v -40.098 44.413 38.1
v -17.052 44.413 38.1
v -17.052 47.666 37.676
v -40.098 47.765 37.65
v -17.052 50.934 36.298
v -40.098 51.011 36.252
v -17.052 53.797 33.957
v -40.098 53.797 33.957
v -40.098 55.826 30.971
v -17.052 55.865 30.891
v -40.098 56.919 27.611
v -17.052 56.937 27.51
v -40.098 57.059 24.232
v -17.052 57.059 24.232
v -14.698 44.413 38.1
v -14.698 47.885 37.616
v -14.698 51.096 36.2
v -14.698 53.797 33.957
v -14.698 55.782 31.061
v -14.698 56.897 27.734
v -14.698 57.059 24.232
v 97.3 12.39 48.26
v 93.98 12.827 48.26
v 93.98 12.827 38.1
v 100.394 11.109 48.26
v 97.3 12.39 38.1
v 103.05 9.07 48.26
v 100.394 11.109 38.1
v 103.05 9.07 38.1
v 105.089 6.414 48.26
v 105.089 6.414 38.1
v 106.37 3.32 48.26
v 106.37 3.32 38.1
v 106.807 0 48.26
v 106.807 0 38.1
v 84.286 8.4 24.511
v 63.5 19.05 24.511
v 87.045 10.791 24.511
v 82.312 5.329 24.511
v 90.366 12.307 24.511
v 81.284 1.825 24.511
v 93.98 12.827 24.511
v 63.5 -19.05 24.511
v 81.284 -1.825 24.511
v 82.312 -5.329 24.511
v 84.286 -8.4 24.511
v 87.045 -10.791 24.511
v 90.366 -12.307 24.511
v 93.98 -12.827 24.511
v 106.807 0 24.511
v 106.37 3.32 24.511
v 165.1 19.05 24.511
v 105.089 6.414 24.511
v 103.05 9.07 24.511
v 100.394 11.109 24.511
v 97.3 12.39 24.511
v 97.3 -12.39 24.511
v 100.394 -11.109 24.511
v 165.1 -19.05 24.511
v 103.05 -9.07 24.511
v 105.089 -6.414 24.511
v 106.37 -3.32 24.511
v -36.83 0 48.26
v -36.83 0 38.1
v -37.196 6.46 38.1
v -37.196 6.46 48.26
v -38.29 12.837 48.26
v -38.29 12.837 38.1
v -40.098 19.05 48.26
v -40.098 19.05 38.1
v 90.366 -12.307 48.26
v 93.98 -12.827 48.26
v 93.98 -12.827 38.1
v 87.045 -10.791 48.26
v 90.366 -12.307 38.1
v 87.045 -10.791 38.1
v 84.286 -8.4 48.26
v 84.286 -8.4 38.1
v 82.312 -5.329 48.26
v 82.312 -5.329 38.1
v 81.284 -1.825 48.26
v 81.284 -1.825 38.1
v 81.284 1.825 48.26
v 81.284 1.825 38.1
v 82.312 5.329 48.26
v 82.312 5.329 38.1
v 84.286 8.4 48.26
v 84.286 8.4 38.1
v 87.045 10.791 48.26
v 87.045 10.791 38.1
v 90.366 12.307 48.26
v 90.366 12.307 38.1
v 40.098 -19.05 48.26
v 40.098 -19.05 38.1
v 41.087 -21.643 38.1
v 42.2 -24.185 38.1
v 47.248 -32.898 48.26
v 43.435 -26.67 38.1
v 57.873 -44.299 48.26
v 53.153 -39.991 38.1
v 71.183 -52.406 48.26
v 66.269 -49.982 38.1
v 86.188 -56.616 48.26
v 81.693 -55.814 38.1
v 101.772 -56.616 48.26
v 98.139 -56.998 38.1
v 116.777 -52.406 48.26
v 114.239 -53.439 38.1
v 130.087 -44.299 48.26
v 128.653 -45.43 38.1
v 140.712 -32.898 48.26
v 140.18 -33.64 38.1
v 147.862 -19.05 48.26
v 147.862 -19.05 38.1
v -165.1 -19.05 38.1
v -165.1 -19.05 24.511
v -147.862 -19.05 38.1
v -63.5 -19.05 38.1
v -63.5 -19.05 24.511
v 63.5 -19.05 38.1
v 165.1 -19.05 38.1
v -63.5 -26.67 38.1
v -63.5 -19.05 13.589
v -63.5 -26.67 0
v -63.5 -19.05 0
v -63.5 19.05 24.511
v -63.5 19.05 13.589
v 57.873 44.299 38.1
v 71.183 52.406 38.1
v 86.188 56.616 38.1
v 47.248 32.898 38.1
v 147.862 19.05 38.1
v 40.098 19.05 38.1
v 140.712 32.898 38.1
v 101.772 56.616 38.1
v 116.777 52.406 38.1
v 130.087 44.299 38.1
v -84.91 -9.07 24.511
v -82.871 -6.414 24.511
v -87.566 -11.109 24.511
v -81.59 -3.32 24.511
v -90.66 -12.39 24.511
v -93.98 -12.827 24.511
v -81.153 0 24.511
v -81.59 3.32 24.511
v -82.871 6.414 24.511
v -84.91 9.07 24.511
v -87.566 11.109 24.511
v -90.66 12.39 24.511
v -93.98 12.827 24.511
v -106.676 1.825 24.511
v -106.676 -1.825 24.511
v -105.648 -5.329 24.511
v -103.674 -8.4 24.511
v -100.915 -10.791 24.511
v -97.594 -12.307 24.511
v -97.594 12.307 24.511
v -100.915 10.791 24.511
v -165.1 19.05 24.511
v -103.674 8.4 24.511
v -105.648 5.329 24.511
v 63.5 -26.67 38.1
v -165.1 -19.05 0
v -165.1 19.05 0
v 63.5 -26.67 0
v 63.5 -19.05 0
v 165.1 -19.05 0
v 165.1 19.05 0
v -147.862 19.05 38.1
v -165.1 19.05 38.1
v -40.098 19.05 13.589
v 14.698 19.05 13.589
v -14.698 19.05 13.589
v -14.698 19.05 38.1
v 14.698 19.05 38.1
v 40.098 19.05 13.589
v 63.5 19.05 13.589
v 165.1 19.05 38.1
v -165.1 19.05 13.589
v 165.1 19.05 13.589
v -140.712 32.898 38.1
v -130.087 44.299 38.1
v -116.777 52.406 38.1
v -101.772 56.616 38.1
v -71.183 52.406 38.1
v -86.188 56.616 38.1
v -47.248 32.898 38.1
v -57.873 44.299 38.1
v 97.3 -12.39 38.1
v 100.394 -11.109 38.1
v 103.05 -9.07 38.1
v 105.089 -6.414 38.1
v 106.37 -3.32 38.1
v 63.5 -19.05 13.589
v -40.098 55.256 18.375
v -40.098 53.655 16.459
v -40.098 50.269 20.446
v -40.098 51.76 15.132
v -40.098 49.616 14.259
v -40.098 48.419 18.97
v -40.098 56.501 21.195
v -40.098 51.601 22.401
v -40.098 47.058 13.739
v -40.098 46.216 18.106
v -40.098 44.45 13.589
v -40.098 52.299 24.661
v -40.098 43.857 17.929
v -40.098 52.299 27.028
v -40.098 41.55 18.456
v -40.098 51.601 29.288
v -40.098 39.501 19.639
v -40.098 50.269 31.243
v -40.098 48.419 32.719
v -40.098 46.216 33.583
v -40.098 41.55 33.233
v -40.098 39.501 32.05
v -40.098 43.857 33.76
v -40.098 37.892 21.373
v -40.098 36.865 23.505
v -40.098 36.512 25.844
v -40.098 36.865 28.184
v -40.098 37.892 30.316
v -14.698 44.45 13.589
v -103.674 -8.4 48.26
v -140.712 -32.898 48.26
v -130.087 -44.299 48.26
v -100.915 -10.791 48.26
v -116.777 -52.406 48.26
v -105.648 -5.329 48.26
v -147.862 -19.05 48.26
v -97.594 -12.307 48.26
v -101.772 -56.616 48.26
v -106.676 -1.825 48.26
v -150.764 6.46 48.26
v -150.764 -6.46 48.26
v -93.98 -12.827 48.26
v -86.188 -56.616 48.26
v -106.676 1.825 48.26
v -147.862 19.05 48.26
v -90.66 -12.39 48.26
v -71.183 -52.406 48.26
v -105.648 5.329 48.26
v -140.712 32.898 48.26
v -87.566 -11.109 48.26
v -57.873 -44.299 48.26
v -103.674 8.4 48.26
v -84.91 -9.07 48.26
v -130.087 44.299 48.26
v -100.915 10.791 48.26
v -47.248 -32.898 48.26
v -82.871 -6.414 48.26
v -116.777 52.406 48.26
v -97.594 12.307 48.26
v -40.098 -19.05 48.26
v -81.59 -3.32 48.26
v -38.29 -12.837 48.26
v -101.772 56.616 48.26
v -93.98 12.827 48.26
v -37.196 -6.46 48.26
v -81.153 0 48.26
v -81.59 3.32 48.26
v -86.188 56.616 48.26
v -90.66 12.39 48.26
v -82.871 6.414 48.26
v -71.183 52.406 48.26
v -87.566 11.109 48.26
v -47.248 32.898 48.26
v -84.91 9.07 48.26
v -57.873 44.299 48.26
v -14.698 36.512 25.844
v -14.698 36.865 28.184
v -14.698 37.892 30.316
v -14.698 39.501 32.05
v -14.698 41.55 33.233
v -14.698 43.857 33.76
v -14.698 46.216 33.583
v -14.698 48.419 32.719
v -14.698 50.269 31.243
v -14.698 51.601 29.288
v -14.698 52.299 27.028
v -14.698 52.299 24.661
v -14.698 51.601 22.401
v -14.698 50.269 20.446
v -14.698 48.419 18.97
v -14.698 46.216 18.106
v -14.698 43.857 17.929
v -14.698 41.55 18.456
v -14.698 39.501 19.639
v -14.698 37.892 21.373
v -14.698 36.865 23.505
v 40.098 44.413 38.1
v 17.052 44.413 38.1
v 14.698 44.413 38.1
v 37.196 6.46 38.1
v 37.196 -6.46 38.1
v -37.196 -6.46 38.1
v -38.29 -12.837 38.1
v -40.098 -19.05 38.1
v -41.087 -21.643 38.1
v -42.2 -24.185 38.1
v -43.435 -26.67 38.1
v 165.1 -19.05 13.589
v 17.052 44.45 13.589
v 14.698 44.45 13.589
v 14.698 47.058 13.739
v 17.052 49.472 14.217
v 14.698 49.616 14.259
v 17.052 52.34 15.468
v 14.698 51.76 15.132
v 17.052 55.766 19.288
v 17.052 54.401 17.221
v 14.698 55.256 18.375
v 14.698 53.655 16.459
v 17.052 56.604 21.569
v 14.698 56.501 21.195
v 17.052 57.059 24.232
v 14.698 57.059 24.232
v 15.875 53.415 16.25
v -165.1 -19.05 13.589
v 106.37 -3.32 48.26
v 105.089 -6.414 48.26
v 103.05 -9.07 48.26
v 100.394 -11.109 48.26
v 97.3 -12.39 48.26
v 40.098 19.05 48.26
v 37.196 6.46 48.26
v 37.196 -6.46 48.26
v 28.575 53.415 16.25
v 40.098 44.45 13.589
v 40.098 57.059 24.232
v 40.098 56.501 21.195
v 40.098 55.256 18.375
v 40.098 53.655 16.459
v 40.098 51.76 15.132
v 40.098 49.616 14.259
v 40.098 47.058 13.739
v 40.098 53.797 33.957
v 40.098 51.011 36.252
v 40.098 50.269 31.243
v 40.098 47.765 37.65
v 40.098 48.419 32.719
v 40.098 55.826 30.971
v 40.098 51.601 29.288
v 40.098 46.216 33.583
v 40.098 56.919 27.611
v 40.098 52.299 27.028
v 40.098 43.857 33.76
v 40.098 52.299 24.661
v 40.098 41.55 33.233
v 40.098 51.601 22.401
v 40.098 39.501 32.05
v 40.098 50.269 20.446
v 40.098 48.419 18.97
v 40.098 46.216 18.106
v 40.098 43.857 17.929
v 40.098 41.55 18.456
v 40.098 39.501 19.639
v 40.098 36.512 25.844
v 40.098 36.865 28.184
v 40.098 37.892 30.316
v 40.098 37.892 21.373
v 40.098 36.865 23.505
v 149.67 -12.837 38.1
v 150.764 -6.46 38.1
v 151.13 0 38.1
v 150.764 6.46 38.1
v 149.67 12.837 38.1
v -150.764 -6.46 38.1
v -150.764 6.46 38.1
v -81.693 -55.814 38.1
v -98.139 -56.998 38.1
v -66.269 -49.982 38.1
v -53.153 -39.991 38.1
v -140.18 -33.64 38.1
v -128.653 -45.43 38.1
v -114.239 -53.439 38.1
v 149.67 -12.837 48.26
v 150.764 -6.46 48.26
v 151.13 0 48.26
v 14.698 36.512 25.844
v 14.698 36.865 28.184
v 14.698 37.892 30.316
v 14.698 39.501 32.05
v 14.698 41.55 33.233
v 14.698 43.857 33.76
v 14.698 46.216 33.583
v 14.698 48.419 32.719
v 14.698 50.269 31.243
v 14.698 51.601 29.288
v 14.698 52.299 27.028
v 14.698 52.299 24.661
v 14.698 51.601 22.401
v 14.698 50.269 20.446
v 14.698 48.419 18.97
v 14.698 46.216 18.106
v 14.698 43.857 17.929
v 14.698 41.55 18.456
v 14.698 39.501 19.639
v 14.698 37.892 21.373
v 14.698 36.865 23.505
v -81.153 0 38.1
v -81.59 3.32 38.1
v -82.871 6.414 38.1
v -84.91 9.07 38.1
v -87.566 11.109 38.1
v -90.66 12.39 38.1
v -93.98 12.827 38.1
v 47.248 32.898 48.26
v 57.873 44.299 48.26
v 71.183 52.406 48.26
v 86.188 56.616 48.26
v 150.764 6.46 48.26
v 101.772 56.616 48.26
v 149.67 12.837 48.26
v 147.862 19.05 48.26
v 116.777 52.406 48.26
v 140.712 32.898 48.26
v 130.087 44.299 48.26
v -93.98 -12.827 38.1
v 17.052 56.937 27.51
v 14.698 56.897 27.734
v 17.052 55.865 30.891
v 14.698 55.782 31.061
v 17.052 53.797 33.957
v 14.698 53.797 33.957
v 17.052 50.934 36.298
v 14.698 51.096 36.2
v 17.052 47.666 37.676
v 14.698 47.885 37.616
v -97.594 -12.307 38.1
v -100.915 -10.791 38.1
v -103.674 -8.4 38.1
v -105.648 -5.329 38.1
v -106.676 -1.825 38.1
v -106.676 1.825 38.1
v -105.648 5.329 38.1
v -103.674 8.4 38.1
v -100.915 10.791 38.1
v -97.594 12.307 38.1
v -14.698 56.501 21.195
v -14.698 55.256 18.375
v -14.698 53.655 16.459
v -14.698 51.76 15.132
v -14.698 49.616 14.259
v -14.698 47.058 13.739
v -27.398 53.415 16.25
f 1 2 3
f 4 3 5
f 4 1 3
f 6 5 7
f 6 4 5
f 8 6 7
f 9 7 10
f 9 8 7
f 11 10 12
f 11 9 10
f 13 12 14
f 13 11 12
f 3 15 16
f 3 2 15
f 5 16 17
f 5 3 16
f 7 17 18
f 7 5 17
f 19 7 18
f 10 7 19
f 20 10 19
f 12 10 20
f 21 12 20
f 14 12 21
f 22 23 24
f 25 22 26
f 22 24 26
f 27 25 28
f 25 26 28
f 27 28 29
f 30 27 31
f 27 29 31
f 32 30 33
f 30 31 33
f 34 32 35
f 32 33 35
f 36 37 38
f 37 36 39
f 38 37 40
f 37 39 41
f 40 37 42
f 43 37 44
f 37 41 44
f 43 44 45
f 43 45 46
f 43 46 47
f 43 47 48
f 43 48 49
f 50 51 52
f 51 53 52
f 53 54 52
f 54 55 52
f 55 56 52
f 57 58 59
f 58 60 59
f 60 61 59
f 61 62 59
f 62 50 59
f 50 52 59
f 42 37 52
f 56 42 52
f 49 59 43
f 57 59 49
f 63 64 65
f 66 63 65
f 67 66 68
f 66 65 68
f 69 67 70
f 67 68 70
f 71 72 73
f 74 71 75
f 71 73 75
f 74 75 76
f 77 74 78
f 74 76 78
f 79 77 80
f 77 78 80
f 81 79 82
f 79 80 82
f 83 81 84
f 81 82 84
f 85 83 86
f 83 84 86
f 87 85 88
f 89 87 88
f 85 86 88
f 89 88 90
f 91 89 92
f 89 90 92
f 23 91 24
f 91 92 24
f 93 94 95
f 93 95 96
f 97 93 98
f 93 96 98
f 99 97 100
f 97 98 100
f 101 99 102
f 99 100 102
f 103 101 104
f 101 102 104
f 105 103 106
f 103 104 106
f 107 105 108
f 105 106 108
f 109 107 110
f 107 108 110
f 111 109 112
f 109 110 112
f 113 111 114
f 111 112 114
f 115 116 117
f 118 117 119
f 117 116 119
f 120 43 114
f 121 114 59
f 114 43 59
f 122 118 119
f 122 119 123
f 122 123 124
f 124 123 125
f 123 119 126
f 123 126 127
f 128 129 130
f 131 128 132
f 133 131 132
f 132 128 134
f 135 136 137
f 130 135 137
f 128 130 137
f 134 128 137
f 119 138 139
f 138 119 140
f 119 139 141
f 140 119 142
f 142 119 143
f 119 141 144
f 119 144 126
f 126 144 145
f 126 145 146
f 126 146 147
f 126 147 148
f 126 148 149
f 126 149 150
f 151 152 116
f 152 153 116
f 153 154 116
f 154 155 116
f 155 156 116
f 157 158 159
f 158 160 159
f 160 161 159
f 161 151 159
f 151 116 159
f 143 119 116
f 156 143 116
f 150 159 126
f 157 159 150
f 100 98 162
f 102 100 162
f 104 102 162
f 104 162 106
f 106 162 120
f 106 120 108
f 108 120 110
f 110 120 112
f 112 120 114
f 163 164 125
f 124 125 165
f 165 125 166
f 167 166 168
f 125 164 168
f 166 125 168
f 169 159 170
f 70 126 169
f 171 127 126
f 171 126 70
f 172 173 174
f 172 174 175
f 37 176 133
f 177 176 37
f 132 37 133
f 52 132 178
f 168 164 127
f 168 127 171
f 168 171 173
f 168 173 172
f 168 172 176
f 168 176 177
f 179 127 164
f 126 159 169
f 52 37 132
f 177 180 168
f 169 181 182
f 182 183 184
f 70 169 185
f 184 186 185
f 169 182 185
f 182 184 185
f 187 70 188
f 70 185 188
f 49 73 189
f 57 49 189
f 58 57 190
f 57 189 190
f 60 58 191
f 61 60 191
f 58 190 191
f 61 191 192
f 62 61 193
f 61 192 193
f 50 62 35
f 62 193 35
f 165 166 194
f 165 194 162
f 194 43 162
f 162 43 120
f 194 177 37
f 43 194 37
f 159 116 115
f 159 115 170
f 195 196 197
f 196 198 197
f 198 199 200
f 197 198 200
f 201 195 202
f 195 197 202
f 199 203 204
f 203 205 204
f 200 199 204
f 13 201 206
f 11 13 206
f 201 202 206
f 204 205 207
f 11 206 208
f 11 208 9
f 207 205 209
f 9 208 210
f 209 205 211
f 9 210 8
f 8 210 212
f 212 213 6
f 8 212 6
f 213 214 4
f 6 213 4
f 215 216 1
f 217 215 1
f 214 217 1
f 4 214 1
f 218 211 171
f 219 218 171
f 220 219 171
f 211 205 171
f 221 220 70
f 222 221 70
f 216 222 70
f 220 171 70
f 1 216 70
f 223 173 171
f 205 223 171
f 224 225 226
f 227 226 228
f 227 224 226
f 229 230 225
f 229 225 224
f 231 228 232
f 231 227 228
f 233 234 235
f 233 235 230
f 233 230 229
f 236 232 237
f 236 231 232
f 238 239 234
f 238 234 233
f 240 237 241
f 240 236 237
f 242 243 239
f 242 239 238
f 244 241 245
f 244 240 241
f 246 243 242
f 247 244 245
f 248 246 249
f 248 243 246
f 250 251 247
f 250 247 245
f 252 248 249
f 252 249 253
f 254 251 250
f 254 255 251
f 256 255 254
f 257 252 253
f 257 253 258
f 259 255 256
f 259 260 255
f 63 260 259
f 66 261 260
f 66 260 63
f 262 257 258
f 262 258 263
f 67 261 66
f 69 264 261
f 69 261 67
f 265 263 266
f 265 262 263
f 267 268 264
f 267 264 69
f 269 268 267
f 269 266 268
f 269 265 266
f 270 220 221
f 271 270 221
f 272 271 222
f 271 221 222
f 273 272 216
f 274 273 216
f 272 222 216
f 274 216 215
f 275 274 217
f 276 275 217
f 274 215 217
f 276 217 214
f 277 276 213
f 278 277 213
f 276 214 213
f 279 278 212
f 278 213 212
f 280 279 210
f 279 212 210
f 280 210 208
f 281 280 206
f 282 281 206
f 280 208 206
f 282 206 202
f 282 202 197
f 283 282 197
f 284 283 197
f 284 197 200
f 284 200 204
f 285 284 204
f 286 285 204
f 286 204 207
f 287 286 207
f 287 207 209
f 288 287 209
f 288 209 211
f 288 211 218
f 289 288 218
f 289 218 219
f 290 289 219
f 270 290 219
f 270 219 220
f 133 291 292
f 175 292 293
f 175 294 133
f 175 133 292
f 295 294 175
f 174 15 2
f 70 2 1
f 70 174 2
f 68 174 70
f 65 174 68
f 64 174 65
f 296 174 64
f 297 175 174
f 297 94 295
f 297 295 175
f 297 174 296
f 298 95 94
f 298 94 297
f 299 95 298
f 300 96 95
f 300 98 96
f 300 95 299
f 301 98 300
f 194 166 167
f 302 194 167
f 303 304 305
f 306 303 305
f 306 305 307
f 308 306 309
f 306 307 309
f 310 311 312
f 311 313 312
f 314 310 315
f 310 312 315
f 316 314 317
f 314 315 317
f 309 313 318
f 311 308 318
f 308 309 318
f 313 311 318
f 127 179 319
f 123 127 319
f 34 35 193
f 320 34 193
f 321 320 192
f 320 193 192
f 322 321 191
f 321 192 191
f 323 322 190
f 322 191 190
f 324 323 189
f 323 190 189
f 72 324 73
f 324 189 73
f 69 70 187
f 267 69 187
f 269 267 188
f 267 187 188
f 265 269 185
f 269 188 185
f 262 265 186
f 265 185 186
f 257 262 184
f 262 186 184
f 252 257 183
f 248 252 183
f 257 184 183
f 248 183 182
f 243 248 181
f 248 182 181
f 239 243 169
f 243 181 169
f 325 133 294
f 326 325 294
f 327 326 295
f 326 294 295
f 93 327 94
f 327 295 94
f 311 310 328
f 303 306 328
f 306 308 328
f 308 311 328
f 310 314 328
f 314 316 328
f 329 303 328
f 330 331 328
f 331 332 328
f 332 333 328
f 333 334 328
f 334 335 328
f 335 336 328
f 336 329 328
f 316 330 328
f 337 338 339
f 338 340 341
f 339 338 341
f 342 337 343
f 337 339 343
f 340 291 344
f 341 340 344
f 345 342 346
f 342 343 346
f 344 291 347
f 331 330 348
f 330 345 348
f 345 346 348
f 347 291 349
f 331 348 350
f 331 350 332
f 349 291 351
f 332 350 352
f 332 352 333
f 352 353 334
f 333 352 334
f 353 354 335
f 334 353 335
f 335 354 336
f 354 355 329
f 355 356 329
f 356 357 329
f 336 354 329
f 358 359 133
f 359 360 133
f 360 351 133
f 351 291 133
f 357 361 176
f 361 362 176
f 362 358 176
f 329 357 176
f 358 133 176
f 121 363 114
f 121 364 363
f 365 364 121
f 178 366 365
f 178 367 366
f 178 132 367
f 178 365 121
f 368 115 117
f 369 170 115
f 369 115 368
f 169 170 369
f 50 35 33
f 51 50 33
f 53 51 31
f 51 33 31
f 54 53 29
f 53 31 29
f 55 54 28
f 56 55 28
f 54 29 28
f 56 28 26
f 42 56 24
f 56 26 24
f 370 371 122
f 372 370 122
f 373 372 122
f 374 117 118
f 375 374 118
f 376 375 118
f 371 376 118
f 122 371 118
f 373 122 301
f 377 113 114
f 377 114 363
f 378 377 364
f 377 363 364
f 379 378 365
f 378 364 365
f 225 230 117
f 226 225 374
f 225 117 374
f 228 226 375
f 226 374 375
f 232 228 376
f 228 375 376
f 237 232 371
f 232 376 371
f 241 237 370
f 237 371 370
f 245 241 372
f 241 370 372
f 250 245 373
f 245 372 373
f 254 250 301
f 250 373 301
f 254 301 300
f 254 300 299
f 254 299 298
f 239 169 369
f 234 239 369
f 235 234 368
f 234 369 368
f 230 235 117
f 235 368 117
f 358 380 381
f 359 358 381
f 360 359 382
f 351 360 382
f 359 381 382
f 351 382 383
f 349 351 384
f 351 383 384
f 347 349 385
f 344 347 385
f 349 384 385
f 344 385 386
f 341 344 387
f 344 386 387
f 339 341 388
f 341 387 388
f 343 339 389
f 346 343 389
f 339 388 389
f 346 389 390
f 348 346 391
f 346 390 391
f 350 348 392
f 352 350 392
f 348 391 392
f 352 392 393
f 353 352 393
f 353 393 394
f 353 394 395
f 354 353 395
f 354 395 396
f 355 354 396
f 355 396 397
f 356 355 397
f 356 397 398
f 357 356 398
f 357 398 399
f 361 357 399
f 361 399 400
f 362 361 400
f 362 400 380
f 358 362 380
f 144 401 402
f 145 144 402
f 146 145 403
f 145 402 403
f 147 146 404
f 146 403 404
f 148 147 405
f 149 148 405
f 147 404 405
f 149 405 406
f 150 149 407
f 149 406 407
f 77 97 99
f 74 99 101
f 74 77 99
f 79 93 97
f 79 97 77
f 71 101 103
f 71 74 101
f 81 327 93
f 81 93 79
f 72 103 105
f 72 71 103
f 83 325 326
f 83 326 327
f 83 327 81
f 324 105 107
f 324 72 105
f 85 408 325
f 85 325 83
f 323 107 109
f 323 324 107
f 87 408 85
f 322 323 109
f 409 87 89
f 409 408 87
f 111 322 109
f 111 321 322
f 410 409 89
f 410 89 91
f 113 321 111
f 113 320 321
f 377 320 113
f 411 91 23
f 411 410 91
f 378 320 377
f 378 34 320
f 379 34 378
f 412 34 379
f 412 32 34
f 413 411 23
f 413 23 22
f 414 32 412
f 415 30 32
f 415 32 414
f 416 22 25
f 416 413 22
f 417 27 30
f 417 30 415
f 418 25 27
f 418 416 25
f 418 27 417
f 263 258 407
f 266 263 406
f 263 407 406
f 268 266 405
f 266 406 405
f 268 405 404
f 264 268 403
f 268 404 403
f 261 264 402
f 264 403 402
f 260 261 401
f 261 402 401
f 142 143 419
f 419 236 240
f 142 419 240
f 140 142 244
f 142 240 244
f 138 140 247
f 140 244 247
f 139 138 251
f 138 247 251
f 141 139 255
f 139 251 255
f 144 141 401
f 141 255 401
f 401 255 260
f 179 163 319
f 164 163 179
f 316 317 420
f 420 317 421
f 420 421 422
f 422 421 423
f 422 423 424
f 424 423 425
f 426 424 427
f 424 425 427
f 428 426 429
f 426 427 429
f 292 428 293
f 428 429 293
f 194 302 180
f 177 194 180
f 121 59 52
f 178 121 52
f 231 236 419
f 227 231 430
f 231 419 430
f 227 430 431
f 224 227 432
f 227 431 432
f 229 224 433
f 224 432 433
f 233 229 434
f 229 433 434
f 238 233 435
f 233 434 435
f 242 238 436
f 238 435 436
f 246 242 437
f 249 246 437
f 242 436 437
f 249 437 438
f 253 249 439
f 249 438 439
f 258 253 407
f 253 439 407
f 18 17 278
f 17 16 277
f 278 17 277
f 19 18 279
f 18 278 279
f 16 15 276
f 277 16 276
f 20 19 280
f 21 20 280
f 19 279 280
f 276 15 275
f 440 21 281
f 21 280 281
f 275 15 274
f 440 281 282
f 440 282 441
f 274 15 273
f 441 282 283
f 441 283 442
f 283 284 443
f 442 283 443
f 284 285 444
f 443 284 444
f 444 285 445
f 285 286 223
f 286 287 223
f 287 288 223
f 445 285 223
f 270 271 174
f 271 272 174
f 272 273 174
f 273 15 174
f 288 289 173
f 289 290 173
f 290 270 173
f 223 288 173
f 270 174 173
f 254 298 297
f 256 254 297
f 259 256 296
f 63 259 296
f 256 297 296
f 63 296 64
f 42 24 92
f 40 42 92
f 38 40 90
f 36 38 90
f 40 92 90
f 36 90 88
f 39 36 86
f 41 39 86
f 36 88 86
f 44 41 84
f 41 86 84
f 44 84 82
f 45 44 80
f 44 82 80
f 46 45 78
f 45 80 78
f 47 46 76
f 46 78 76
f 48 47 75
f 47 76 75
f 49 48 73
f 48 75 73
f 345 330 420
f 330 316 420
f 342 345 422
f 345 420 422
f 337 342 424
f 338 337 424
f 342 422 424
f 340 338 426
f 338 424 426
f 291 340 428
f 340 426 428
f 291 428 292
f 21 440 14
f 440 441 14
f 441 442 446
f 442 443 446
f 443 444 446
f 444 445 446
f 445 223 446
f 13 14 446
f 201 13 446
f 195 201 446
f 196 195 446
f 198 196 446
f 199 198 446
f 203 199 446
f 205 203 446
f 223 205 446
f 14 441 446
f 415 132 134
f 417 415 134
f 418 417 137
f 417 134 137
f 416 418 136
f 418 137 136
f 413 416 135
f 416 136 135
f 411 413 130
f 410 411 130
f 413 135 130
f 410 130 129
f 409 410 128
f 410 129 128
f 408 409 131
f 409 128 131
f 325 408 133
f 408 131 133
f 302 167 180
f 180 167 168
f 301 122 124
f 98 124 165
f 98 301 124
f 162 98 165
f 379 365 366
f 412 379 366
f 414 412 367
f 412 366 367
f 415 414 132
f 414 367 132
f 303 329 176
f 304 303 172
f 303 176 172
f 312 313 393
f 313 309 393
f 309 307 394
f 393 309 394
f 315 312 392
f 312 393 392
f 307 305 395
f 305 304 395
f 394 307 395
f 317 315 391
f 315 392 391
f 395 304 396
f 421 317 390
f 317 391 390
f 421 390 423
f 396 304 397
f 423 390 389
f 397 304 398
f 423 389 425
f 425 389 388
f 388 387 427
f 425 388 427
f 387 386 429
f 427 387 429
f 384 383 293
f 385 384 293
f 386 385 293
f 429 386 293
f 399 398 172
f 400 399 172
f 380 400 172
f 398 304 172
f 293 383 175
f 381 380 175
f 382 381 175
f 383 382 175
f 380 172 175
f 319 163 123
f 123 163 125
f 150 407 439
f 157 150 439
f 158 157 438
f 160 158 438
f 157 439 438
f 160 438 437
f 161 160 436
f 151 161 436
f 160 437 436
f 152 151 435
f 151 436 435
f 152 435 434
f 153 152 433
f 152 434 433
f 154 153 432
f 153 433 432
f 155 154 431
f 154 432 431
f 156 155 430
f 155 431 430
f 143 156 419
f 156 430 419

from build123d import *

# Parameters (mm, degrees)
F0_W         = 330.2
F0_H         = 38.1
F1_DEPTH     = 38.1
F2_W         = 19.05
F2_H         = 10.922
F3_DEPTH     = 101.6
F4_W         = 19.05
F4_H         = 10.922
F5_DEPTH     = 101.6
F7_DEPTH     = 22.86
F8_DEPTH     = 10.16
F10_DEPTH    = 7.62
F11_W        = 25.4
F11_H        = 13.589
F11_H_2      = 10.922
F12_DEPTH    = 38.1
F13_T1_DEPTH = 88.9
F13_T3_DEPTH = 88.9
F14_R        = 12.7
F16_DEPTH    = 101.6


# Not quite as in the source:
# - a fillet or chamfer that OpenCascade refuses, or shapes differently, is made with other operations: its cross-section is extruded or revolved along the edge and cut away or added
# - after a boolean that leaves OpenCascade's solid faulty, fix() repairs it
# - a feature names something its author has since deleted; it is built from what else it names


with BuildPart() as f1:
    # F0 (on Top) → F1 (new body)
    with BuildSketch(Plane.XY):
        Rectangle(F0_W, F0_H)
    extrude(amount=F1_DEPTH)

    # F2 (on face) → F3 (cut)
    with BuildSketch(Plane(origin=(-165.1, 0, 0), x_dir=(0, -1, 0), z_dir=(-1, 0, 0))):
        with Locations((9.525, 19.05)):
            Rectangle(F2_W, F2_H)
        with Locations((-9.525, 19.05)):
            Rectangle(F2_W, F2_H)
    extrude(amount=-F3_DEPTH, mode=Mode.SUBTRACT)

    # F4 (on face) → F5 (cut)
    with BuildSketch(Plane.YZ.offset(165.1)):
        with Locations((-9.525, 19.05)):
            Rectangle(F4_W, F4_H)
        with Locations((9.525, 19.05)):
            Rectangle(F4_W, F4_H)
    extrude(amount=-F5_DEPTH, mode=Mode.SUBTRACT)

    # F6 (on face) → F7 (cut)
    with BuildSketch(Plane.XY.offset(38.1)):
        with BuildLine():
            Line((-93.98, 12.827), (-93.98, -12.827))
            ThreePointArc((-93.98, -12.827), (-84.9099413177, -9.0700586823), (-81.153, 0))
            ThreePointArc((-81.153, 0), (-84.9099413177, 9.0700586823), (-93.98, 12.827))
        make_face()
        with BuildLine():
            ThreePointArc((-93.98, 12.827), (-106.807, 0), (-93.98, -12.827))
            Line((-93.98, -12.827), (-93.98, 12.827))
        make_face()
        with BuildLine():
            ThreePointArc((93.98, 12.827), (81.153, 0), (93.98, -12.827))
            Line((93.98, -12.827), (93.98, 12.827))
        make_face()
        with BuildLine():
            Line((93.98, 12.827), (93.98, -12.827))
            ThreePointArc((93.98, -12.827), (103.0500586823, -9.0700586823), (106.807, 0))
            ThreePointArc((106.807, 0), (103.0500586823, 9.0700586823), (93.98, 12.827))
        make_face()
    extrude(amount=-F7_DEPTH, mode=Mode.SUBTRACT)

    # F6 (on face) → F8 (join)
    with BuildSketch(Plane.XY.offset(38.1)):
        with BuildLine():
            ThreePointArc((110.7805208253, 19.05), (93.98, 25.4), (77.1794791747, 19.05))
            Line((77.1794791747, 19.05), (93.98, 19.05))
            Line((93.98, 19.05), (110.7805208253, 19.05))
        make_face()
        with BuildLine():
            Line((110.7805208253, -19.05), (147.8615367264, -19.05))
            ThreePointArc((147.8615367264, -19.05), (150.3069576842, -9.6641780842), (151.13, 0))
            ThreePointArc((151.13, 0), (150.3069576842, 9.6641780842), (147.8615367264, 19.05))
            Line((147.8615367264, 19.05), (110.7805208253, 19.05))
            ThreePointArc((110.7805208253, 19.05), (117.1305208253, 10.4505208253), (119.38, 0))
            ThreePointArc((119.38, 0), (117.1305208253, -10.4505208253), (110.7805208253, -19.05))
        make_face()
        with BuildLine():
            ThreePointArc((147.8615367264, 19.05), (93.98, 57.15), (40.0984632736, 19.05))
            Line((40.0984632736, 19.05), (77.1794791747, 19.05))
            ThreePointArc((77.1794791747, 19.05), (93.98, 25.4), (110.7805208253, 19.05))
            Line((110.7805208253, 19.05), (147.8615367264, 19.05))
        make_face()
        with BuildLine():
            ThreePointArc((77.1794791747, 19.05), (68.58, 0), (77.1794791747, -19.05))
            Line((77.1794791747, -19.05), (93.98, -19.05))
            Line((93.98, -19.05), (93.98, -12.827))
            ThreePointArc((93.98, -12.827), (81.153, 0), (93.98, 12.827))
            Line((93.98, 12.827), (93.98, 19.05))
            Line((93.98, 19.05), (77.1794791747, 19.05))
        make_face()
        with BuildLine():
            Line((93.98, -19.05), (110.7805208253, -19.05))
            ThreePointArc((110.7805208253, -19.05), (117.1305208253, -10.4505208253), (119.38, 0))
            ThreePointArc((119.38, 0), (117.1305208253, 10.4505208253), (110.7805208253, 19.05))
            Line((110.7805208253, 19.05), (93.98, 19.05))
            Line((93.98, 19.05), (93.98, 12.827))
            ThreePointArc((93.98, 12.827), (103.0500586823, 9.0700586823), (106.807, 0))
            ThreePointArc((106.807, 0), (103.0500586823, -9.0700586823), (93.98, -12.827))
            Line((93.98, -12.827), (93.98, -19.05))
        make_face()
        with BuildLine():
            ThreePointArc((40.0984632736, 19.05), (36.83, 0), (40.0984632736, -19.05))
            Line((40.0984632736, -19.05), (77.1794791747, -19.05))
            ThreePointArc((77.1794791747, -19.05), (68.58, 0), (77.1794791747, 19.05))
            Line((77.1794791747, 19.05), (40.0984632736, 19.05))
        make_face()
        with BuildLine():
            Line((77.1794791747, -19.05), (40.0984632736, -19.05))
            ThreePointArc((40.0984632736, -19.05), (93.98, -57.15), (147.8615367264, -19.05))
            Line((147.8615367264, -19.05), (110.7805208253, -19.05))
            ThreePointArc((110.7805208253, -19.05), (93.98, -25.4), (77.1794791747, -19.05))
        make_face()
        with BuildLine():
            Line((93.98, -19.05), (77.1794791747, -19.05))
            ThreePointArc((77.1794791747, -19.05), (93.98, -25.4), (110.7805208253, -19.05))
            Line((110.7805208253, -19.05), (93.98, -19.05))
        make_face()
        with BuildLine():
            Line((-93.98, -12.827), (-93.98, -19.05))
            Line((-93.98, -19.05), (-40.0984632736, -19.05))
            ThreePointArc((-40.0984632736, -19.05), (-37.6530423158, -9.6641780842), (-36.83, 0))
            ThreePointArc((-36.83, 0), (-37.6530423158, 9.6641780842), (-40.0984632736, 19.05))
            Line((-40.0984632736, 19.05), (-93.98, 19.05))
            Line((-93.98, 19.05), (-93.98, 12.827))
            ThreePointArc((-93.98, 12.827), (-84.9099413177, 9.0700586823), (-81.153, 0))
            ThreePointArc((-81.153, 0), (-84.9099413177, -9.0700586823), (-93.98, -12.827))
        make_face()
        with BuildLine():
            Line((-147.8615367264, -19.05), (-93.98, -19.05))
            Line((-93.98, -19.05), (-93.98, -12.827))
            ThreePointArc((-93.98, -12.827), (-106.807, 0), (-93.98, 12.827))
            Line((-93.98, 12.827), (-93.98, 19.05))
            Line((-93.98, 19.05), (-147.8615367264, 19.05))
            ThreePointArc((-147.8615367264, 19.05), (-151.13, 0), (-147.8615367264, -19.05))
        make_face()
        with BuildLine():
            Line((-40.0984632736, -19.05), (-93.98, -19.05))
            Line((-93.98, -19.05), (-147.8615367264, -19.05))
            ThreePointArc((-147.8615367264, -19.05), (-93.98, -57.15), (-40.0984632736, -19.05))
        make_face()
        with BuildLine():
            ThreePointArc((-40.0984632736, 19.05), (-93.98, 57.15), (-147.8615367264, 19.05))
            Line((-147.8615367264, 19.05), (-93.98, 19.05))
            Line((-93.98, 19.05), (-40.0984632736, 19.05))
        make_face()
    extrude(amount=F8_DEPTH)

    # F9 (on face) → F10 (join)
    with BuildSketch(Plane.XZ.offset(19.05)):
        Polygon((0, 0), (0, 38.1), (-40.0984632736, 38.1), (-63.5, 38.1), (-63.5, 30.861), (-63.5, 24.511), (-63.5, 19.939), (-63.5, 13.589), (-63.5, 0), align=None)
        Polygon((63.5, 30.861), (63.5, 38.1), (40.0984632736, 38.1), (13.5538854515, 38.1), (0, 38.1), (0, 0), (63.5, 0), (63.5, 13.589), (63.5, 19.939), (63.5, 24.511), align=None)
    extrude(amount=F10_DEPTH)

    add(f1.part.fix(), mode=Mode.REPLACE)

    # F11 (on face) → F12 (join)
    with BuildSketch(Plane(origin=(0, 19.05, 0), x_dir=(-1, 0, 0), z_dir=(0, 1, 0))):
        with Locations((-27.3984632736, 31.3055)):
            Rectangle(F11_W, F11_H)
        with Locations((-27.3984632736, 19.05)):
            Rectangle(F11_W, F11_H_2)
        with Locations((27.3984632736, 19.05)):
            Rectangle(F11_W, F11_H_2)
        with Locations((27.3984632736, 31.3055)):
            Rectangle(F11_W, F11_H)
    extrude(amount=F12_DEPTH)

    # F13: fillet of radius 12.7 on 2 edges, made by hand

    # F13_s2 → F13_t1 (cut)
    with BuildSketch(Plane.YZ.offset(-71.8484632736)):
        with BuildLine():
            add(Edge.make_bspline(
                [(44.45, 13.589), (57.15, 13.589), (57.15, 26.289)],
                knots=[0, 0, 0, 1, 1, 1], degree=2, weights=[1, 1, 1]))
            Line((57.15, 26.289), (57.15, 13.589))
            Line((57.15, 13.589), (44.45, 13.589))
        make_face()
    extrude(amount=F13_T1_DEPTH, mode=Mode.SUBTRACT)

    # F13_s4 → F13_t3 (cut)
    with BuildSketch(Plane.YZ.offset(-17.0515367264)):
        with BuildLine():
            add(Edge.make_bspline(
                [(44.45, 13.589), (57.15, 13.589), (57.15, 26.289)],
                knots=[0, 0, 0, 1, 1, 1], degree=2, weights=[1, 1, 1]))
            Line((57.15, 26.289), (57.15, 13.589))
            Line((57.15, 13.589), (44.45, 13.589))
        make_face()
    extrude(amount=F13_T3_DEPTH, mode=Mode.SUBTRACT)

    # F14
    f14_edges = [f1.edges().sort_by_distance(p)[0] for p in [
        (27.398463, 57.15, 38.1),
        (-27.398463, 57.15, 38.1),
    ]]
    fillet(f14_edges, radius=F14_R)

    # F15 (on face) → F16 (cut)
    with BuildSketch(Plane(origin=(-40.0984632736, 0, 0), x_dir=(0, -1, 0), z_dir=(-1, 0, 0))):
        with BuildLine():
            ThreePointArc((-52.3875, 25.8445), (-44.45, 17.907), (-36.5125, 25.8445))
            Line((-36.5125, 25.8445), (-52.3875, 25.8445))
        make_face()
        with BuildLine():
            Line((-52.3875, 25.8445), (-36.5125, 25.8445))
            ThreePointArc((-36.5125, 25.8445), (-44.45, 33.782), (-52.3875, 25.8445))
        make_face()
    extrude(amount=-F16_DEPTH, mode=Mode.SUBTRACT)


solid = f1.part
